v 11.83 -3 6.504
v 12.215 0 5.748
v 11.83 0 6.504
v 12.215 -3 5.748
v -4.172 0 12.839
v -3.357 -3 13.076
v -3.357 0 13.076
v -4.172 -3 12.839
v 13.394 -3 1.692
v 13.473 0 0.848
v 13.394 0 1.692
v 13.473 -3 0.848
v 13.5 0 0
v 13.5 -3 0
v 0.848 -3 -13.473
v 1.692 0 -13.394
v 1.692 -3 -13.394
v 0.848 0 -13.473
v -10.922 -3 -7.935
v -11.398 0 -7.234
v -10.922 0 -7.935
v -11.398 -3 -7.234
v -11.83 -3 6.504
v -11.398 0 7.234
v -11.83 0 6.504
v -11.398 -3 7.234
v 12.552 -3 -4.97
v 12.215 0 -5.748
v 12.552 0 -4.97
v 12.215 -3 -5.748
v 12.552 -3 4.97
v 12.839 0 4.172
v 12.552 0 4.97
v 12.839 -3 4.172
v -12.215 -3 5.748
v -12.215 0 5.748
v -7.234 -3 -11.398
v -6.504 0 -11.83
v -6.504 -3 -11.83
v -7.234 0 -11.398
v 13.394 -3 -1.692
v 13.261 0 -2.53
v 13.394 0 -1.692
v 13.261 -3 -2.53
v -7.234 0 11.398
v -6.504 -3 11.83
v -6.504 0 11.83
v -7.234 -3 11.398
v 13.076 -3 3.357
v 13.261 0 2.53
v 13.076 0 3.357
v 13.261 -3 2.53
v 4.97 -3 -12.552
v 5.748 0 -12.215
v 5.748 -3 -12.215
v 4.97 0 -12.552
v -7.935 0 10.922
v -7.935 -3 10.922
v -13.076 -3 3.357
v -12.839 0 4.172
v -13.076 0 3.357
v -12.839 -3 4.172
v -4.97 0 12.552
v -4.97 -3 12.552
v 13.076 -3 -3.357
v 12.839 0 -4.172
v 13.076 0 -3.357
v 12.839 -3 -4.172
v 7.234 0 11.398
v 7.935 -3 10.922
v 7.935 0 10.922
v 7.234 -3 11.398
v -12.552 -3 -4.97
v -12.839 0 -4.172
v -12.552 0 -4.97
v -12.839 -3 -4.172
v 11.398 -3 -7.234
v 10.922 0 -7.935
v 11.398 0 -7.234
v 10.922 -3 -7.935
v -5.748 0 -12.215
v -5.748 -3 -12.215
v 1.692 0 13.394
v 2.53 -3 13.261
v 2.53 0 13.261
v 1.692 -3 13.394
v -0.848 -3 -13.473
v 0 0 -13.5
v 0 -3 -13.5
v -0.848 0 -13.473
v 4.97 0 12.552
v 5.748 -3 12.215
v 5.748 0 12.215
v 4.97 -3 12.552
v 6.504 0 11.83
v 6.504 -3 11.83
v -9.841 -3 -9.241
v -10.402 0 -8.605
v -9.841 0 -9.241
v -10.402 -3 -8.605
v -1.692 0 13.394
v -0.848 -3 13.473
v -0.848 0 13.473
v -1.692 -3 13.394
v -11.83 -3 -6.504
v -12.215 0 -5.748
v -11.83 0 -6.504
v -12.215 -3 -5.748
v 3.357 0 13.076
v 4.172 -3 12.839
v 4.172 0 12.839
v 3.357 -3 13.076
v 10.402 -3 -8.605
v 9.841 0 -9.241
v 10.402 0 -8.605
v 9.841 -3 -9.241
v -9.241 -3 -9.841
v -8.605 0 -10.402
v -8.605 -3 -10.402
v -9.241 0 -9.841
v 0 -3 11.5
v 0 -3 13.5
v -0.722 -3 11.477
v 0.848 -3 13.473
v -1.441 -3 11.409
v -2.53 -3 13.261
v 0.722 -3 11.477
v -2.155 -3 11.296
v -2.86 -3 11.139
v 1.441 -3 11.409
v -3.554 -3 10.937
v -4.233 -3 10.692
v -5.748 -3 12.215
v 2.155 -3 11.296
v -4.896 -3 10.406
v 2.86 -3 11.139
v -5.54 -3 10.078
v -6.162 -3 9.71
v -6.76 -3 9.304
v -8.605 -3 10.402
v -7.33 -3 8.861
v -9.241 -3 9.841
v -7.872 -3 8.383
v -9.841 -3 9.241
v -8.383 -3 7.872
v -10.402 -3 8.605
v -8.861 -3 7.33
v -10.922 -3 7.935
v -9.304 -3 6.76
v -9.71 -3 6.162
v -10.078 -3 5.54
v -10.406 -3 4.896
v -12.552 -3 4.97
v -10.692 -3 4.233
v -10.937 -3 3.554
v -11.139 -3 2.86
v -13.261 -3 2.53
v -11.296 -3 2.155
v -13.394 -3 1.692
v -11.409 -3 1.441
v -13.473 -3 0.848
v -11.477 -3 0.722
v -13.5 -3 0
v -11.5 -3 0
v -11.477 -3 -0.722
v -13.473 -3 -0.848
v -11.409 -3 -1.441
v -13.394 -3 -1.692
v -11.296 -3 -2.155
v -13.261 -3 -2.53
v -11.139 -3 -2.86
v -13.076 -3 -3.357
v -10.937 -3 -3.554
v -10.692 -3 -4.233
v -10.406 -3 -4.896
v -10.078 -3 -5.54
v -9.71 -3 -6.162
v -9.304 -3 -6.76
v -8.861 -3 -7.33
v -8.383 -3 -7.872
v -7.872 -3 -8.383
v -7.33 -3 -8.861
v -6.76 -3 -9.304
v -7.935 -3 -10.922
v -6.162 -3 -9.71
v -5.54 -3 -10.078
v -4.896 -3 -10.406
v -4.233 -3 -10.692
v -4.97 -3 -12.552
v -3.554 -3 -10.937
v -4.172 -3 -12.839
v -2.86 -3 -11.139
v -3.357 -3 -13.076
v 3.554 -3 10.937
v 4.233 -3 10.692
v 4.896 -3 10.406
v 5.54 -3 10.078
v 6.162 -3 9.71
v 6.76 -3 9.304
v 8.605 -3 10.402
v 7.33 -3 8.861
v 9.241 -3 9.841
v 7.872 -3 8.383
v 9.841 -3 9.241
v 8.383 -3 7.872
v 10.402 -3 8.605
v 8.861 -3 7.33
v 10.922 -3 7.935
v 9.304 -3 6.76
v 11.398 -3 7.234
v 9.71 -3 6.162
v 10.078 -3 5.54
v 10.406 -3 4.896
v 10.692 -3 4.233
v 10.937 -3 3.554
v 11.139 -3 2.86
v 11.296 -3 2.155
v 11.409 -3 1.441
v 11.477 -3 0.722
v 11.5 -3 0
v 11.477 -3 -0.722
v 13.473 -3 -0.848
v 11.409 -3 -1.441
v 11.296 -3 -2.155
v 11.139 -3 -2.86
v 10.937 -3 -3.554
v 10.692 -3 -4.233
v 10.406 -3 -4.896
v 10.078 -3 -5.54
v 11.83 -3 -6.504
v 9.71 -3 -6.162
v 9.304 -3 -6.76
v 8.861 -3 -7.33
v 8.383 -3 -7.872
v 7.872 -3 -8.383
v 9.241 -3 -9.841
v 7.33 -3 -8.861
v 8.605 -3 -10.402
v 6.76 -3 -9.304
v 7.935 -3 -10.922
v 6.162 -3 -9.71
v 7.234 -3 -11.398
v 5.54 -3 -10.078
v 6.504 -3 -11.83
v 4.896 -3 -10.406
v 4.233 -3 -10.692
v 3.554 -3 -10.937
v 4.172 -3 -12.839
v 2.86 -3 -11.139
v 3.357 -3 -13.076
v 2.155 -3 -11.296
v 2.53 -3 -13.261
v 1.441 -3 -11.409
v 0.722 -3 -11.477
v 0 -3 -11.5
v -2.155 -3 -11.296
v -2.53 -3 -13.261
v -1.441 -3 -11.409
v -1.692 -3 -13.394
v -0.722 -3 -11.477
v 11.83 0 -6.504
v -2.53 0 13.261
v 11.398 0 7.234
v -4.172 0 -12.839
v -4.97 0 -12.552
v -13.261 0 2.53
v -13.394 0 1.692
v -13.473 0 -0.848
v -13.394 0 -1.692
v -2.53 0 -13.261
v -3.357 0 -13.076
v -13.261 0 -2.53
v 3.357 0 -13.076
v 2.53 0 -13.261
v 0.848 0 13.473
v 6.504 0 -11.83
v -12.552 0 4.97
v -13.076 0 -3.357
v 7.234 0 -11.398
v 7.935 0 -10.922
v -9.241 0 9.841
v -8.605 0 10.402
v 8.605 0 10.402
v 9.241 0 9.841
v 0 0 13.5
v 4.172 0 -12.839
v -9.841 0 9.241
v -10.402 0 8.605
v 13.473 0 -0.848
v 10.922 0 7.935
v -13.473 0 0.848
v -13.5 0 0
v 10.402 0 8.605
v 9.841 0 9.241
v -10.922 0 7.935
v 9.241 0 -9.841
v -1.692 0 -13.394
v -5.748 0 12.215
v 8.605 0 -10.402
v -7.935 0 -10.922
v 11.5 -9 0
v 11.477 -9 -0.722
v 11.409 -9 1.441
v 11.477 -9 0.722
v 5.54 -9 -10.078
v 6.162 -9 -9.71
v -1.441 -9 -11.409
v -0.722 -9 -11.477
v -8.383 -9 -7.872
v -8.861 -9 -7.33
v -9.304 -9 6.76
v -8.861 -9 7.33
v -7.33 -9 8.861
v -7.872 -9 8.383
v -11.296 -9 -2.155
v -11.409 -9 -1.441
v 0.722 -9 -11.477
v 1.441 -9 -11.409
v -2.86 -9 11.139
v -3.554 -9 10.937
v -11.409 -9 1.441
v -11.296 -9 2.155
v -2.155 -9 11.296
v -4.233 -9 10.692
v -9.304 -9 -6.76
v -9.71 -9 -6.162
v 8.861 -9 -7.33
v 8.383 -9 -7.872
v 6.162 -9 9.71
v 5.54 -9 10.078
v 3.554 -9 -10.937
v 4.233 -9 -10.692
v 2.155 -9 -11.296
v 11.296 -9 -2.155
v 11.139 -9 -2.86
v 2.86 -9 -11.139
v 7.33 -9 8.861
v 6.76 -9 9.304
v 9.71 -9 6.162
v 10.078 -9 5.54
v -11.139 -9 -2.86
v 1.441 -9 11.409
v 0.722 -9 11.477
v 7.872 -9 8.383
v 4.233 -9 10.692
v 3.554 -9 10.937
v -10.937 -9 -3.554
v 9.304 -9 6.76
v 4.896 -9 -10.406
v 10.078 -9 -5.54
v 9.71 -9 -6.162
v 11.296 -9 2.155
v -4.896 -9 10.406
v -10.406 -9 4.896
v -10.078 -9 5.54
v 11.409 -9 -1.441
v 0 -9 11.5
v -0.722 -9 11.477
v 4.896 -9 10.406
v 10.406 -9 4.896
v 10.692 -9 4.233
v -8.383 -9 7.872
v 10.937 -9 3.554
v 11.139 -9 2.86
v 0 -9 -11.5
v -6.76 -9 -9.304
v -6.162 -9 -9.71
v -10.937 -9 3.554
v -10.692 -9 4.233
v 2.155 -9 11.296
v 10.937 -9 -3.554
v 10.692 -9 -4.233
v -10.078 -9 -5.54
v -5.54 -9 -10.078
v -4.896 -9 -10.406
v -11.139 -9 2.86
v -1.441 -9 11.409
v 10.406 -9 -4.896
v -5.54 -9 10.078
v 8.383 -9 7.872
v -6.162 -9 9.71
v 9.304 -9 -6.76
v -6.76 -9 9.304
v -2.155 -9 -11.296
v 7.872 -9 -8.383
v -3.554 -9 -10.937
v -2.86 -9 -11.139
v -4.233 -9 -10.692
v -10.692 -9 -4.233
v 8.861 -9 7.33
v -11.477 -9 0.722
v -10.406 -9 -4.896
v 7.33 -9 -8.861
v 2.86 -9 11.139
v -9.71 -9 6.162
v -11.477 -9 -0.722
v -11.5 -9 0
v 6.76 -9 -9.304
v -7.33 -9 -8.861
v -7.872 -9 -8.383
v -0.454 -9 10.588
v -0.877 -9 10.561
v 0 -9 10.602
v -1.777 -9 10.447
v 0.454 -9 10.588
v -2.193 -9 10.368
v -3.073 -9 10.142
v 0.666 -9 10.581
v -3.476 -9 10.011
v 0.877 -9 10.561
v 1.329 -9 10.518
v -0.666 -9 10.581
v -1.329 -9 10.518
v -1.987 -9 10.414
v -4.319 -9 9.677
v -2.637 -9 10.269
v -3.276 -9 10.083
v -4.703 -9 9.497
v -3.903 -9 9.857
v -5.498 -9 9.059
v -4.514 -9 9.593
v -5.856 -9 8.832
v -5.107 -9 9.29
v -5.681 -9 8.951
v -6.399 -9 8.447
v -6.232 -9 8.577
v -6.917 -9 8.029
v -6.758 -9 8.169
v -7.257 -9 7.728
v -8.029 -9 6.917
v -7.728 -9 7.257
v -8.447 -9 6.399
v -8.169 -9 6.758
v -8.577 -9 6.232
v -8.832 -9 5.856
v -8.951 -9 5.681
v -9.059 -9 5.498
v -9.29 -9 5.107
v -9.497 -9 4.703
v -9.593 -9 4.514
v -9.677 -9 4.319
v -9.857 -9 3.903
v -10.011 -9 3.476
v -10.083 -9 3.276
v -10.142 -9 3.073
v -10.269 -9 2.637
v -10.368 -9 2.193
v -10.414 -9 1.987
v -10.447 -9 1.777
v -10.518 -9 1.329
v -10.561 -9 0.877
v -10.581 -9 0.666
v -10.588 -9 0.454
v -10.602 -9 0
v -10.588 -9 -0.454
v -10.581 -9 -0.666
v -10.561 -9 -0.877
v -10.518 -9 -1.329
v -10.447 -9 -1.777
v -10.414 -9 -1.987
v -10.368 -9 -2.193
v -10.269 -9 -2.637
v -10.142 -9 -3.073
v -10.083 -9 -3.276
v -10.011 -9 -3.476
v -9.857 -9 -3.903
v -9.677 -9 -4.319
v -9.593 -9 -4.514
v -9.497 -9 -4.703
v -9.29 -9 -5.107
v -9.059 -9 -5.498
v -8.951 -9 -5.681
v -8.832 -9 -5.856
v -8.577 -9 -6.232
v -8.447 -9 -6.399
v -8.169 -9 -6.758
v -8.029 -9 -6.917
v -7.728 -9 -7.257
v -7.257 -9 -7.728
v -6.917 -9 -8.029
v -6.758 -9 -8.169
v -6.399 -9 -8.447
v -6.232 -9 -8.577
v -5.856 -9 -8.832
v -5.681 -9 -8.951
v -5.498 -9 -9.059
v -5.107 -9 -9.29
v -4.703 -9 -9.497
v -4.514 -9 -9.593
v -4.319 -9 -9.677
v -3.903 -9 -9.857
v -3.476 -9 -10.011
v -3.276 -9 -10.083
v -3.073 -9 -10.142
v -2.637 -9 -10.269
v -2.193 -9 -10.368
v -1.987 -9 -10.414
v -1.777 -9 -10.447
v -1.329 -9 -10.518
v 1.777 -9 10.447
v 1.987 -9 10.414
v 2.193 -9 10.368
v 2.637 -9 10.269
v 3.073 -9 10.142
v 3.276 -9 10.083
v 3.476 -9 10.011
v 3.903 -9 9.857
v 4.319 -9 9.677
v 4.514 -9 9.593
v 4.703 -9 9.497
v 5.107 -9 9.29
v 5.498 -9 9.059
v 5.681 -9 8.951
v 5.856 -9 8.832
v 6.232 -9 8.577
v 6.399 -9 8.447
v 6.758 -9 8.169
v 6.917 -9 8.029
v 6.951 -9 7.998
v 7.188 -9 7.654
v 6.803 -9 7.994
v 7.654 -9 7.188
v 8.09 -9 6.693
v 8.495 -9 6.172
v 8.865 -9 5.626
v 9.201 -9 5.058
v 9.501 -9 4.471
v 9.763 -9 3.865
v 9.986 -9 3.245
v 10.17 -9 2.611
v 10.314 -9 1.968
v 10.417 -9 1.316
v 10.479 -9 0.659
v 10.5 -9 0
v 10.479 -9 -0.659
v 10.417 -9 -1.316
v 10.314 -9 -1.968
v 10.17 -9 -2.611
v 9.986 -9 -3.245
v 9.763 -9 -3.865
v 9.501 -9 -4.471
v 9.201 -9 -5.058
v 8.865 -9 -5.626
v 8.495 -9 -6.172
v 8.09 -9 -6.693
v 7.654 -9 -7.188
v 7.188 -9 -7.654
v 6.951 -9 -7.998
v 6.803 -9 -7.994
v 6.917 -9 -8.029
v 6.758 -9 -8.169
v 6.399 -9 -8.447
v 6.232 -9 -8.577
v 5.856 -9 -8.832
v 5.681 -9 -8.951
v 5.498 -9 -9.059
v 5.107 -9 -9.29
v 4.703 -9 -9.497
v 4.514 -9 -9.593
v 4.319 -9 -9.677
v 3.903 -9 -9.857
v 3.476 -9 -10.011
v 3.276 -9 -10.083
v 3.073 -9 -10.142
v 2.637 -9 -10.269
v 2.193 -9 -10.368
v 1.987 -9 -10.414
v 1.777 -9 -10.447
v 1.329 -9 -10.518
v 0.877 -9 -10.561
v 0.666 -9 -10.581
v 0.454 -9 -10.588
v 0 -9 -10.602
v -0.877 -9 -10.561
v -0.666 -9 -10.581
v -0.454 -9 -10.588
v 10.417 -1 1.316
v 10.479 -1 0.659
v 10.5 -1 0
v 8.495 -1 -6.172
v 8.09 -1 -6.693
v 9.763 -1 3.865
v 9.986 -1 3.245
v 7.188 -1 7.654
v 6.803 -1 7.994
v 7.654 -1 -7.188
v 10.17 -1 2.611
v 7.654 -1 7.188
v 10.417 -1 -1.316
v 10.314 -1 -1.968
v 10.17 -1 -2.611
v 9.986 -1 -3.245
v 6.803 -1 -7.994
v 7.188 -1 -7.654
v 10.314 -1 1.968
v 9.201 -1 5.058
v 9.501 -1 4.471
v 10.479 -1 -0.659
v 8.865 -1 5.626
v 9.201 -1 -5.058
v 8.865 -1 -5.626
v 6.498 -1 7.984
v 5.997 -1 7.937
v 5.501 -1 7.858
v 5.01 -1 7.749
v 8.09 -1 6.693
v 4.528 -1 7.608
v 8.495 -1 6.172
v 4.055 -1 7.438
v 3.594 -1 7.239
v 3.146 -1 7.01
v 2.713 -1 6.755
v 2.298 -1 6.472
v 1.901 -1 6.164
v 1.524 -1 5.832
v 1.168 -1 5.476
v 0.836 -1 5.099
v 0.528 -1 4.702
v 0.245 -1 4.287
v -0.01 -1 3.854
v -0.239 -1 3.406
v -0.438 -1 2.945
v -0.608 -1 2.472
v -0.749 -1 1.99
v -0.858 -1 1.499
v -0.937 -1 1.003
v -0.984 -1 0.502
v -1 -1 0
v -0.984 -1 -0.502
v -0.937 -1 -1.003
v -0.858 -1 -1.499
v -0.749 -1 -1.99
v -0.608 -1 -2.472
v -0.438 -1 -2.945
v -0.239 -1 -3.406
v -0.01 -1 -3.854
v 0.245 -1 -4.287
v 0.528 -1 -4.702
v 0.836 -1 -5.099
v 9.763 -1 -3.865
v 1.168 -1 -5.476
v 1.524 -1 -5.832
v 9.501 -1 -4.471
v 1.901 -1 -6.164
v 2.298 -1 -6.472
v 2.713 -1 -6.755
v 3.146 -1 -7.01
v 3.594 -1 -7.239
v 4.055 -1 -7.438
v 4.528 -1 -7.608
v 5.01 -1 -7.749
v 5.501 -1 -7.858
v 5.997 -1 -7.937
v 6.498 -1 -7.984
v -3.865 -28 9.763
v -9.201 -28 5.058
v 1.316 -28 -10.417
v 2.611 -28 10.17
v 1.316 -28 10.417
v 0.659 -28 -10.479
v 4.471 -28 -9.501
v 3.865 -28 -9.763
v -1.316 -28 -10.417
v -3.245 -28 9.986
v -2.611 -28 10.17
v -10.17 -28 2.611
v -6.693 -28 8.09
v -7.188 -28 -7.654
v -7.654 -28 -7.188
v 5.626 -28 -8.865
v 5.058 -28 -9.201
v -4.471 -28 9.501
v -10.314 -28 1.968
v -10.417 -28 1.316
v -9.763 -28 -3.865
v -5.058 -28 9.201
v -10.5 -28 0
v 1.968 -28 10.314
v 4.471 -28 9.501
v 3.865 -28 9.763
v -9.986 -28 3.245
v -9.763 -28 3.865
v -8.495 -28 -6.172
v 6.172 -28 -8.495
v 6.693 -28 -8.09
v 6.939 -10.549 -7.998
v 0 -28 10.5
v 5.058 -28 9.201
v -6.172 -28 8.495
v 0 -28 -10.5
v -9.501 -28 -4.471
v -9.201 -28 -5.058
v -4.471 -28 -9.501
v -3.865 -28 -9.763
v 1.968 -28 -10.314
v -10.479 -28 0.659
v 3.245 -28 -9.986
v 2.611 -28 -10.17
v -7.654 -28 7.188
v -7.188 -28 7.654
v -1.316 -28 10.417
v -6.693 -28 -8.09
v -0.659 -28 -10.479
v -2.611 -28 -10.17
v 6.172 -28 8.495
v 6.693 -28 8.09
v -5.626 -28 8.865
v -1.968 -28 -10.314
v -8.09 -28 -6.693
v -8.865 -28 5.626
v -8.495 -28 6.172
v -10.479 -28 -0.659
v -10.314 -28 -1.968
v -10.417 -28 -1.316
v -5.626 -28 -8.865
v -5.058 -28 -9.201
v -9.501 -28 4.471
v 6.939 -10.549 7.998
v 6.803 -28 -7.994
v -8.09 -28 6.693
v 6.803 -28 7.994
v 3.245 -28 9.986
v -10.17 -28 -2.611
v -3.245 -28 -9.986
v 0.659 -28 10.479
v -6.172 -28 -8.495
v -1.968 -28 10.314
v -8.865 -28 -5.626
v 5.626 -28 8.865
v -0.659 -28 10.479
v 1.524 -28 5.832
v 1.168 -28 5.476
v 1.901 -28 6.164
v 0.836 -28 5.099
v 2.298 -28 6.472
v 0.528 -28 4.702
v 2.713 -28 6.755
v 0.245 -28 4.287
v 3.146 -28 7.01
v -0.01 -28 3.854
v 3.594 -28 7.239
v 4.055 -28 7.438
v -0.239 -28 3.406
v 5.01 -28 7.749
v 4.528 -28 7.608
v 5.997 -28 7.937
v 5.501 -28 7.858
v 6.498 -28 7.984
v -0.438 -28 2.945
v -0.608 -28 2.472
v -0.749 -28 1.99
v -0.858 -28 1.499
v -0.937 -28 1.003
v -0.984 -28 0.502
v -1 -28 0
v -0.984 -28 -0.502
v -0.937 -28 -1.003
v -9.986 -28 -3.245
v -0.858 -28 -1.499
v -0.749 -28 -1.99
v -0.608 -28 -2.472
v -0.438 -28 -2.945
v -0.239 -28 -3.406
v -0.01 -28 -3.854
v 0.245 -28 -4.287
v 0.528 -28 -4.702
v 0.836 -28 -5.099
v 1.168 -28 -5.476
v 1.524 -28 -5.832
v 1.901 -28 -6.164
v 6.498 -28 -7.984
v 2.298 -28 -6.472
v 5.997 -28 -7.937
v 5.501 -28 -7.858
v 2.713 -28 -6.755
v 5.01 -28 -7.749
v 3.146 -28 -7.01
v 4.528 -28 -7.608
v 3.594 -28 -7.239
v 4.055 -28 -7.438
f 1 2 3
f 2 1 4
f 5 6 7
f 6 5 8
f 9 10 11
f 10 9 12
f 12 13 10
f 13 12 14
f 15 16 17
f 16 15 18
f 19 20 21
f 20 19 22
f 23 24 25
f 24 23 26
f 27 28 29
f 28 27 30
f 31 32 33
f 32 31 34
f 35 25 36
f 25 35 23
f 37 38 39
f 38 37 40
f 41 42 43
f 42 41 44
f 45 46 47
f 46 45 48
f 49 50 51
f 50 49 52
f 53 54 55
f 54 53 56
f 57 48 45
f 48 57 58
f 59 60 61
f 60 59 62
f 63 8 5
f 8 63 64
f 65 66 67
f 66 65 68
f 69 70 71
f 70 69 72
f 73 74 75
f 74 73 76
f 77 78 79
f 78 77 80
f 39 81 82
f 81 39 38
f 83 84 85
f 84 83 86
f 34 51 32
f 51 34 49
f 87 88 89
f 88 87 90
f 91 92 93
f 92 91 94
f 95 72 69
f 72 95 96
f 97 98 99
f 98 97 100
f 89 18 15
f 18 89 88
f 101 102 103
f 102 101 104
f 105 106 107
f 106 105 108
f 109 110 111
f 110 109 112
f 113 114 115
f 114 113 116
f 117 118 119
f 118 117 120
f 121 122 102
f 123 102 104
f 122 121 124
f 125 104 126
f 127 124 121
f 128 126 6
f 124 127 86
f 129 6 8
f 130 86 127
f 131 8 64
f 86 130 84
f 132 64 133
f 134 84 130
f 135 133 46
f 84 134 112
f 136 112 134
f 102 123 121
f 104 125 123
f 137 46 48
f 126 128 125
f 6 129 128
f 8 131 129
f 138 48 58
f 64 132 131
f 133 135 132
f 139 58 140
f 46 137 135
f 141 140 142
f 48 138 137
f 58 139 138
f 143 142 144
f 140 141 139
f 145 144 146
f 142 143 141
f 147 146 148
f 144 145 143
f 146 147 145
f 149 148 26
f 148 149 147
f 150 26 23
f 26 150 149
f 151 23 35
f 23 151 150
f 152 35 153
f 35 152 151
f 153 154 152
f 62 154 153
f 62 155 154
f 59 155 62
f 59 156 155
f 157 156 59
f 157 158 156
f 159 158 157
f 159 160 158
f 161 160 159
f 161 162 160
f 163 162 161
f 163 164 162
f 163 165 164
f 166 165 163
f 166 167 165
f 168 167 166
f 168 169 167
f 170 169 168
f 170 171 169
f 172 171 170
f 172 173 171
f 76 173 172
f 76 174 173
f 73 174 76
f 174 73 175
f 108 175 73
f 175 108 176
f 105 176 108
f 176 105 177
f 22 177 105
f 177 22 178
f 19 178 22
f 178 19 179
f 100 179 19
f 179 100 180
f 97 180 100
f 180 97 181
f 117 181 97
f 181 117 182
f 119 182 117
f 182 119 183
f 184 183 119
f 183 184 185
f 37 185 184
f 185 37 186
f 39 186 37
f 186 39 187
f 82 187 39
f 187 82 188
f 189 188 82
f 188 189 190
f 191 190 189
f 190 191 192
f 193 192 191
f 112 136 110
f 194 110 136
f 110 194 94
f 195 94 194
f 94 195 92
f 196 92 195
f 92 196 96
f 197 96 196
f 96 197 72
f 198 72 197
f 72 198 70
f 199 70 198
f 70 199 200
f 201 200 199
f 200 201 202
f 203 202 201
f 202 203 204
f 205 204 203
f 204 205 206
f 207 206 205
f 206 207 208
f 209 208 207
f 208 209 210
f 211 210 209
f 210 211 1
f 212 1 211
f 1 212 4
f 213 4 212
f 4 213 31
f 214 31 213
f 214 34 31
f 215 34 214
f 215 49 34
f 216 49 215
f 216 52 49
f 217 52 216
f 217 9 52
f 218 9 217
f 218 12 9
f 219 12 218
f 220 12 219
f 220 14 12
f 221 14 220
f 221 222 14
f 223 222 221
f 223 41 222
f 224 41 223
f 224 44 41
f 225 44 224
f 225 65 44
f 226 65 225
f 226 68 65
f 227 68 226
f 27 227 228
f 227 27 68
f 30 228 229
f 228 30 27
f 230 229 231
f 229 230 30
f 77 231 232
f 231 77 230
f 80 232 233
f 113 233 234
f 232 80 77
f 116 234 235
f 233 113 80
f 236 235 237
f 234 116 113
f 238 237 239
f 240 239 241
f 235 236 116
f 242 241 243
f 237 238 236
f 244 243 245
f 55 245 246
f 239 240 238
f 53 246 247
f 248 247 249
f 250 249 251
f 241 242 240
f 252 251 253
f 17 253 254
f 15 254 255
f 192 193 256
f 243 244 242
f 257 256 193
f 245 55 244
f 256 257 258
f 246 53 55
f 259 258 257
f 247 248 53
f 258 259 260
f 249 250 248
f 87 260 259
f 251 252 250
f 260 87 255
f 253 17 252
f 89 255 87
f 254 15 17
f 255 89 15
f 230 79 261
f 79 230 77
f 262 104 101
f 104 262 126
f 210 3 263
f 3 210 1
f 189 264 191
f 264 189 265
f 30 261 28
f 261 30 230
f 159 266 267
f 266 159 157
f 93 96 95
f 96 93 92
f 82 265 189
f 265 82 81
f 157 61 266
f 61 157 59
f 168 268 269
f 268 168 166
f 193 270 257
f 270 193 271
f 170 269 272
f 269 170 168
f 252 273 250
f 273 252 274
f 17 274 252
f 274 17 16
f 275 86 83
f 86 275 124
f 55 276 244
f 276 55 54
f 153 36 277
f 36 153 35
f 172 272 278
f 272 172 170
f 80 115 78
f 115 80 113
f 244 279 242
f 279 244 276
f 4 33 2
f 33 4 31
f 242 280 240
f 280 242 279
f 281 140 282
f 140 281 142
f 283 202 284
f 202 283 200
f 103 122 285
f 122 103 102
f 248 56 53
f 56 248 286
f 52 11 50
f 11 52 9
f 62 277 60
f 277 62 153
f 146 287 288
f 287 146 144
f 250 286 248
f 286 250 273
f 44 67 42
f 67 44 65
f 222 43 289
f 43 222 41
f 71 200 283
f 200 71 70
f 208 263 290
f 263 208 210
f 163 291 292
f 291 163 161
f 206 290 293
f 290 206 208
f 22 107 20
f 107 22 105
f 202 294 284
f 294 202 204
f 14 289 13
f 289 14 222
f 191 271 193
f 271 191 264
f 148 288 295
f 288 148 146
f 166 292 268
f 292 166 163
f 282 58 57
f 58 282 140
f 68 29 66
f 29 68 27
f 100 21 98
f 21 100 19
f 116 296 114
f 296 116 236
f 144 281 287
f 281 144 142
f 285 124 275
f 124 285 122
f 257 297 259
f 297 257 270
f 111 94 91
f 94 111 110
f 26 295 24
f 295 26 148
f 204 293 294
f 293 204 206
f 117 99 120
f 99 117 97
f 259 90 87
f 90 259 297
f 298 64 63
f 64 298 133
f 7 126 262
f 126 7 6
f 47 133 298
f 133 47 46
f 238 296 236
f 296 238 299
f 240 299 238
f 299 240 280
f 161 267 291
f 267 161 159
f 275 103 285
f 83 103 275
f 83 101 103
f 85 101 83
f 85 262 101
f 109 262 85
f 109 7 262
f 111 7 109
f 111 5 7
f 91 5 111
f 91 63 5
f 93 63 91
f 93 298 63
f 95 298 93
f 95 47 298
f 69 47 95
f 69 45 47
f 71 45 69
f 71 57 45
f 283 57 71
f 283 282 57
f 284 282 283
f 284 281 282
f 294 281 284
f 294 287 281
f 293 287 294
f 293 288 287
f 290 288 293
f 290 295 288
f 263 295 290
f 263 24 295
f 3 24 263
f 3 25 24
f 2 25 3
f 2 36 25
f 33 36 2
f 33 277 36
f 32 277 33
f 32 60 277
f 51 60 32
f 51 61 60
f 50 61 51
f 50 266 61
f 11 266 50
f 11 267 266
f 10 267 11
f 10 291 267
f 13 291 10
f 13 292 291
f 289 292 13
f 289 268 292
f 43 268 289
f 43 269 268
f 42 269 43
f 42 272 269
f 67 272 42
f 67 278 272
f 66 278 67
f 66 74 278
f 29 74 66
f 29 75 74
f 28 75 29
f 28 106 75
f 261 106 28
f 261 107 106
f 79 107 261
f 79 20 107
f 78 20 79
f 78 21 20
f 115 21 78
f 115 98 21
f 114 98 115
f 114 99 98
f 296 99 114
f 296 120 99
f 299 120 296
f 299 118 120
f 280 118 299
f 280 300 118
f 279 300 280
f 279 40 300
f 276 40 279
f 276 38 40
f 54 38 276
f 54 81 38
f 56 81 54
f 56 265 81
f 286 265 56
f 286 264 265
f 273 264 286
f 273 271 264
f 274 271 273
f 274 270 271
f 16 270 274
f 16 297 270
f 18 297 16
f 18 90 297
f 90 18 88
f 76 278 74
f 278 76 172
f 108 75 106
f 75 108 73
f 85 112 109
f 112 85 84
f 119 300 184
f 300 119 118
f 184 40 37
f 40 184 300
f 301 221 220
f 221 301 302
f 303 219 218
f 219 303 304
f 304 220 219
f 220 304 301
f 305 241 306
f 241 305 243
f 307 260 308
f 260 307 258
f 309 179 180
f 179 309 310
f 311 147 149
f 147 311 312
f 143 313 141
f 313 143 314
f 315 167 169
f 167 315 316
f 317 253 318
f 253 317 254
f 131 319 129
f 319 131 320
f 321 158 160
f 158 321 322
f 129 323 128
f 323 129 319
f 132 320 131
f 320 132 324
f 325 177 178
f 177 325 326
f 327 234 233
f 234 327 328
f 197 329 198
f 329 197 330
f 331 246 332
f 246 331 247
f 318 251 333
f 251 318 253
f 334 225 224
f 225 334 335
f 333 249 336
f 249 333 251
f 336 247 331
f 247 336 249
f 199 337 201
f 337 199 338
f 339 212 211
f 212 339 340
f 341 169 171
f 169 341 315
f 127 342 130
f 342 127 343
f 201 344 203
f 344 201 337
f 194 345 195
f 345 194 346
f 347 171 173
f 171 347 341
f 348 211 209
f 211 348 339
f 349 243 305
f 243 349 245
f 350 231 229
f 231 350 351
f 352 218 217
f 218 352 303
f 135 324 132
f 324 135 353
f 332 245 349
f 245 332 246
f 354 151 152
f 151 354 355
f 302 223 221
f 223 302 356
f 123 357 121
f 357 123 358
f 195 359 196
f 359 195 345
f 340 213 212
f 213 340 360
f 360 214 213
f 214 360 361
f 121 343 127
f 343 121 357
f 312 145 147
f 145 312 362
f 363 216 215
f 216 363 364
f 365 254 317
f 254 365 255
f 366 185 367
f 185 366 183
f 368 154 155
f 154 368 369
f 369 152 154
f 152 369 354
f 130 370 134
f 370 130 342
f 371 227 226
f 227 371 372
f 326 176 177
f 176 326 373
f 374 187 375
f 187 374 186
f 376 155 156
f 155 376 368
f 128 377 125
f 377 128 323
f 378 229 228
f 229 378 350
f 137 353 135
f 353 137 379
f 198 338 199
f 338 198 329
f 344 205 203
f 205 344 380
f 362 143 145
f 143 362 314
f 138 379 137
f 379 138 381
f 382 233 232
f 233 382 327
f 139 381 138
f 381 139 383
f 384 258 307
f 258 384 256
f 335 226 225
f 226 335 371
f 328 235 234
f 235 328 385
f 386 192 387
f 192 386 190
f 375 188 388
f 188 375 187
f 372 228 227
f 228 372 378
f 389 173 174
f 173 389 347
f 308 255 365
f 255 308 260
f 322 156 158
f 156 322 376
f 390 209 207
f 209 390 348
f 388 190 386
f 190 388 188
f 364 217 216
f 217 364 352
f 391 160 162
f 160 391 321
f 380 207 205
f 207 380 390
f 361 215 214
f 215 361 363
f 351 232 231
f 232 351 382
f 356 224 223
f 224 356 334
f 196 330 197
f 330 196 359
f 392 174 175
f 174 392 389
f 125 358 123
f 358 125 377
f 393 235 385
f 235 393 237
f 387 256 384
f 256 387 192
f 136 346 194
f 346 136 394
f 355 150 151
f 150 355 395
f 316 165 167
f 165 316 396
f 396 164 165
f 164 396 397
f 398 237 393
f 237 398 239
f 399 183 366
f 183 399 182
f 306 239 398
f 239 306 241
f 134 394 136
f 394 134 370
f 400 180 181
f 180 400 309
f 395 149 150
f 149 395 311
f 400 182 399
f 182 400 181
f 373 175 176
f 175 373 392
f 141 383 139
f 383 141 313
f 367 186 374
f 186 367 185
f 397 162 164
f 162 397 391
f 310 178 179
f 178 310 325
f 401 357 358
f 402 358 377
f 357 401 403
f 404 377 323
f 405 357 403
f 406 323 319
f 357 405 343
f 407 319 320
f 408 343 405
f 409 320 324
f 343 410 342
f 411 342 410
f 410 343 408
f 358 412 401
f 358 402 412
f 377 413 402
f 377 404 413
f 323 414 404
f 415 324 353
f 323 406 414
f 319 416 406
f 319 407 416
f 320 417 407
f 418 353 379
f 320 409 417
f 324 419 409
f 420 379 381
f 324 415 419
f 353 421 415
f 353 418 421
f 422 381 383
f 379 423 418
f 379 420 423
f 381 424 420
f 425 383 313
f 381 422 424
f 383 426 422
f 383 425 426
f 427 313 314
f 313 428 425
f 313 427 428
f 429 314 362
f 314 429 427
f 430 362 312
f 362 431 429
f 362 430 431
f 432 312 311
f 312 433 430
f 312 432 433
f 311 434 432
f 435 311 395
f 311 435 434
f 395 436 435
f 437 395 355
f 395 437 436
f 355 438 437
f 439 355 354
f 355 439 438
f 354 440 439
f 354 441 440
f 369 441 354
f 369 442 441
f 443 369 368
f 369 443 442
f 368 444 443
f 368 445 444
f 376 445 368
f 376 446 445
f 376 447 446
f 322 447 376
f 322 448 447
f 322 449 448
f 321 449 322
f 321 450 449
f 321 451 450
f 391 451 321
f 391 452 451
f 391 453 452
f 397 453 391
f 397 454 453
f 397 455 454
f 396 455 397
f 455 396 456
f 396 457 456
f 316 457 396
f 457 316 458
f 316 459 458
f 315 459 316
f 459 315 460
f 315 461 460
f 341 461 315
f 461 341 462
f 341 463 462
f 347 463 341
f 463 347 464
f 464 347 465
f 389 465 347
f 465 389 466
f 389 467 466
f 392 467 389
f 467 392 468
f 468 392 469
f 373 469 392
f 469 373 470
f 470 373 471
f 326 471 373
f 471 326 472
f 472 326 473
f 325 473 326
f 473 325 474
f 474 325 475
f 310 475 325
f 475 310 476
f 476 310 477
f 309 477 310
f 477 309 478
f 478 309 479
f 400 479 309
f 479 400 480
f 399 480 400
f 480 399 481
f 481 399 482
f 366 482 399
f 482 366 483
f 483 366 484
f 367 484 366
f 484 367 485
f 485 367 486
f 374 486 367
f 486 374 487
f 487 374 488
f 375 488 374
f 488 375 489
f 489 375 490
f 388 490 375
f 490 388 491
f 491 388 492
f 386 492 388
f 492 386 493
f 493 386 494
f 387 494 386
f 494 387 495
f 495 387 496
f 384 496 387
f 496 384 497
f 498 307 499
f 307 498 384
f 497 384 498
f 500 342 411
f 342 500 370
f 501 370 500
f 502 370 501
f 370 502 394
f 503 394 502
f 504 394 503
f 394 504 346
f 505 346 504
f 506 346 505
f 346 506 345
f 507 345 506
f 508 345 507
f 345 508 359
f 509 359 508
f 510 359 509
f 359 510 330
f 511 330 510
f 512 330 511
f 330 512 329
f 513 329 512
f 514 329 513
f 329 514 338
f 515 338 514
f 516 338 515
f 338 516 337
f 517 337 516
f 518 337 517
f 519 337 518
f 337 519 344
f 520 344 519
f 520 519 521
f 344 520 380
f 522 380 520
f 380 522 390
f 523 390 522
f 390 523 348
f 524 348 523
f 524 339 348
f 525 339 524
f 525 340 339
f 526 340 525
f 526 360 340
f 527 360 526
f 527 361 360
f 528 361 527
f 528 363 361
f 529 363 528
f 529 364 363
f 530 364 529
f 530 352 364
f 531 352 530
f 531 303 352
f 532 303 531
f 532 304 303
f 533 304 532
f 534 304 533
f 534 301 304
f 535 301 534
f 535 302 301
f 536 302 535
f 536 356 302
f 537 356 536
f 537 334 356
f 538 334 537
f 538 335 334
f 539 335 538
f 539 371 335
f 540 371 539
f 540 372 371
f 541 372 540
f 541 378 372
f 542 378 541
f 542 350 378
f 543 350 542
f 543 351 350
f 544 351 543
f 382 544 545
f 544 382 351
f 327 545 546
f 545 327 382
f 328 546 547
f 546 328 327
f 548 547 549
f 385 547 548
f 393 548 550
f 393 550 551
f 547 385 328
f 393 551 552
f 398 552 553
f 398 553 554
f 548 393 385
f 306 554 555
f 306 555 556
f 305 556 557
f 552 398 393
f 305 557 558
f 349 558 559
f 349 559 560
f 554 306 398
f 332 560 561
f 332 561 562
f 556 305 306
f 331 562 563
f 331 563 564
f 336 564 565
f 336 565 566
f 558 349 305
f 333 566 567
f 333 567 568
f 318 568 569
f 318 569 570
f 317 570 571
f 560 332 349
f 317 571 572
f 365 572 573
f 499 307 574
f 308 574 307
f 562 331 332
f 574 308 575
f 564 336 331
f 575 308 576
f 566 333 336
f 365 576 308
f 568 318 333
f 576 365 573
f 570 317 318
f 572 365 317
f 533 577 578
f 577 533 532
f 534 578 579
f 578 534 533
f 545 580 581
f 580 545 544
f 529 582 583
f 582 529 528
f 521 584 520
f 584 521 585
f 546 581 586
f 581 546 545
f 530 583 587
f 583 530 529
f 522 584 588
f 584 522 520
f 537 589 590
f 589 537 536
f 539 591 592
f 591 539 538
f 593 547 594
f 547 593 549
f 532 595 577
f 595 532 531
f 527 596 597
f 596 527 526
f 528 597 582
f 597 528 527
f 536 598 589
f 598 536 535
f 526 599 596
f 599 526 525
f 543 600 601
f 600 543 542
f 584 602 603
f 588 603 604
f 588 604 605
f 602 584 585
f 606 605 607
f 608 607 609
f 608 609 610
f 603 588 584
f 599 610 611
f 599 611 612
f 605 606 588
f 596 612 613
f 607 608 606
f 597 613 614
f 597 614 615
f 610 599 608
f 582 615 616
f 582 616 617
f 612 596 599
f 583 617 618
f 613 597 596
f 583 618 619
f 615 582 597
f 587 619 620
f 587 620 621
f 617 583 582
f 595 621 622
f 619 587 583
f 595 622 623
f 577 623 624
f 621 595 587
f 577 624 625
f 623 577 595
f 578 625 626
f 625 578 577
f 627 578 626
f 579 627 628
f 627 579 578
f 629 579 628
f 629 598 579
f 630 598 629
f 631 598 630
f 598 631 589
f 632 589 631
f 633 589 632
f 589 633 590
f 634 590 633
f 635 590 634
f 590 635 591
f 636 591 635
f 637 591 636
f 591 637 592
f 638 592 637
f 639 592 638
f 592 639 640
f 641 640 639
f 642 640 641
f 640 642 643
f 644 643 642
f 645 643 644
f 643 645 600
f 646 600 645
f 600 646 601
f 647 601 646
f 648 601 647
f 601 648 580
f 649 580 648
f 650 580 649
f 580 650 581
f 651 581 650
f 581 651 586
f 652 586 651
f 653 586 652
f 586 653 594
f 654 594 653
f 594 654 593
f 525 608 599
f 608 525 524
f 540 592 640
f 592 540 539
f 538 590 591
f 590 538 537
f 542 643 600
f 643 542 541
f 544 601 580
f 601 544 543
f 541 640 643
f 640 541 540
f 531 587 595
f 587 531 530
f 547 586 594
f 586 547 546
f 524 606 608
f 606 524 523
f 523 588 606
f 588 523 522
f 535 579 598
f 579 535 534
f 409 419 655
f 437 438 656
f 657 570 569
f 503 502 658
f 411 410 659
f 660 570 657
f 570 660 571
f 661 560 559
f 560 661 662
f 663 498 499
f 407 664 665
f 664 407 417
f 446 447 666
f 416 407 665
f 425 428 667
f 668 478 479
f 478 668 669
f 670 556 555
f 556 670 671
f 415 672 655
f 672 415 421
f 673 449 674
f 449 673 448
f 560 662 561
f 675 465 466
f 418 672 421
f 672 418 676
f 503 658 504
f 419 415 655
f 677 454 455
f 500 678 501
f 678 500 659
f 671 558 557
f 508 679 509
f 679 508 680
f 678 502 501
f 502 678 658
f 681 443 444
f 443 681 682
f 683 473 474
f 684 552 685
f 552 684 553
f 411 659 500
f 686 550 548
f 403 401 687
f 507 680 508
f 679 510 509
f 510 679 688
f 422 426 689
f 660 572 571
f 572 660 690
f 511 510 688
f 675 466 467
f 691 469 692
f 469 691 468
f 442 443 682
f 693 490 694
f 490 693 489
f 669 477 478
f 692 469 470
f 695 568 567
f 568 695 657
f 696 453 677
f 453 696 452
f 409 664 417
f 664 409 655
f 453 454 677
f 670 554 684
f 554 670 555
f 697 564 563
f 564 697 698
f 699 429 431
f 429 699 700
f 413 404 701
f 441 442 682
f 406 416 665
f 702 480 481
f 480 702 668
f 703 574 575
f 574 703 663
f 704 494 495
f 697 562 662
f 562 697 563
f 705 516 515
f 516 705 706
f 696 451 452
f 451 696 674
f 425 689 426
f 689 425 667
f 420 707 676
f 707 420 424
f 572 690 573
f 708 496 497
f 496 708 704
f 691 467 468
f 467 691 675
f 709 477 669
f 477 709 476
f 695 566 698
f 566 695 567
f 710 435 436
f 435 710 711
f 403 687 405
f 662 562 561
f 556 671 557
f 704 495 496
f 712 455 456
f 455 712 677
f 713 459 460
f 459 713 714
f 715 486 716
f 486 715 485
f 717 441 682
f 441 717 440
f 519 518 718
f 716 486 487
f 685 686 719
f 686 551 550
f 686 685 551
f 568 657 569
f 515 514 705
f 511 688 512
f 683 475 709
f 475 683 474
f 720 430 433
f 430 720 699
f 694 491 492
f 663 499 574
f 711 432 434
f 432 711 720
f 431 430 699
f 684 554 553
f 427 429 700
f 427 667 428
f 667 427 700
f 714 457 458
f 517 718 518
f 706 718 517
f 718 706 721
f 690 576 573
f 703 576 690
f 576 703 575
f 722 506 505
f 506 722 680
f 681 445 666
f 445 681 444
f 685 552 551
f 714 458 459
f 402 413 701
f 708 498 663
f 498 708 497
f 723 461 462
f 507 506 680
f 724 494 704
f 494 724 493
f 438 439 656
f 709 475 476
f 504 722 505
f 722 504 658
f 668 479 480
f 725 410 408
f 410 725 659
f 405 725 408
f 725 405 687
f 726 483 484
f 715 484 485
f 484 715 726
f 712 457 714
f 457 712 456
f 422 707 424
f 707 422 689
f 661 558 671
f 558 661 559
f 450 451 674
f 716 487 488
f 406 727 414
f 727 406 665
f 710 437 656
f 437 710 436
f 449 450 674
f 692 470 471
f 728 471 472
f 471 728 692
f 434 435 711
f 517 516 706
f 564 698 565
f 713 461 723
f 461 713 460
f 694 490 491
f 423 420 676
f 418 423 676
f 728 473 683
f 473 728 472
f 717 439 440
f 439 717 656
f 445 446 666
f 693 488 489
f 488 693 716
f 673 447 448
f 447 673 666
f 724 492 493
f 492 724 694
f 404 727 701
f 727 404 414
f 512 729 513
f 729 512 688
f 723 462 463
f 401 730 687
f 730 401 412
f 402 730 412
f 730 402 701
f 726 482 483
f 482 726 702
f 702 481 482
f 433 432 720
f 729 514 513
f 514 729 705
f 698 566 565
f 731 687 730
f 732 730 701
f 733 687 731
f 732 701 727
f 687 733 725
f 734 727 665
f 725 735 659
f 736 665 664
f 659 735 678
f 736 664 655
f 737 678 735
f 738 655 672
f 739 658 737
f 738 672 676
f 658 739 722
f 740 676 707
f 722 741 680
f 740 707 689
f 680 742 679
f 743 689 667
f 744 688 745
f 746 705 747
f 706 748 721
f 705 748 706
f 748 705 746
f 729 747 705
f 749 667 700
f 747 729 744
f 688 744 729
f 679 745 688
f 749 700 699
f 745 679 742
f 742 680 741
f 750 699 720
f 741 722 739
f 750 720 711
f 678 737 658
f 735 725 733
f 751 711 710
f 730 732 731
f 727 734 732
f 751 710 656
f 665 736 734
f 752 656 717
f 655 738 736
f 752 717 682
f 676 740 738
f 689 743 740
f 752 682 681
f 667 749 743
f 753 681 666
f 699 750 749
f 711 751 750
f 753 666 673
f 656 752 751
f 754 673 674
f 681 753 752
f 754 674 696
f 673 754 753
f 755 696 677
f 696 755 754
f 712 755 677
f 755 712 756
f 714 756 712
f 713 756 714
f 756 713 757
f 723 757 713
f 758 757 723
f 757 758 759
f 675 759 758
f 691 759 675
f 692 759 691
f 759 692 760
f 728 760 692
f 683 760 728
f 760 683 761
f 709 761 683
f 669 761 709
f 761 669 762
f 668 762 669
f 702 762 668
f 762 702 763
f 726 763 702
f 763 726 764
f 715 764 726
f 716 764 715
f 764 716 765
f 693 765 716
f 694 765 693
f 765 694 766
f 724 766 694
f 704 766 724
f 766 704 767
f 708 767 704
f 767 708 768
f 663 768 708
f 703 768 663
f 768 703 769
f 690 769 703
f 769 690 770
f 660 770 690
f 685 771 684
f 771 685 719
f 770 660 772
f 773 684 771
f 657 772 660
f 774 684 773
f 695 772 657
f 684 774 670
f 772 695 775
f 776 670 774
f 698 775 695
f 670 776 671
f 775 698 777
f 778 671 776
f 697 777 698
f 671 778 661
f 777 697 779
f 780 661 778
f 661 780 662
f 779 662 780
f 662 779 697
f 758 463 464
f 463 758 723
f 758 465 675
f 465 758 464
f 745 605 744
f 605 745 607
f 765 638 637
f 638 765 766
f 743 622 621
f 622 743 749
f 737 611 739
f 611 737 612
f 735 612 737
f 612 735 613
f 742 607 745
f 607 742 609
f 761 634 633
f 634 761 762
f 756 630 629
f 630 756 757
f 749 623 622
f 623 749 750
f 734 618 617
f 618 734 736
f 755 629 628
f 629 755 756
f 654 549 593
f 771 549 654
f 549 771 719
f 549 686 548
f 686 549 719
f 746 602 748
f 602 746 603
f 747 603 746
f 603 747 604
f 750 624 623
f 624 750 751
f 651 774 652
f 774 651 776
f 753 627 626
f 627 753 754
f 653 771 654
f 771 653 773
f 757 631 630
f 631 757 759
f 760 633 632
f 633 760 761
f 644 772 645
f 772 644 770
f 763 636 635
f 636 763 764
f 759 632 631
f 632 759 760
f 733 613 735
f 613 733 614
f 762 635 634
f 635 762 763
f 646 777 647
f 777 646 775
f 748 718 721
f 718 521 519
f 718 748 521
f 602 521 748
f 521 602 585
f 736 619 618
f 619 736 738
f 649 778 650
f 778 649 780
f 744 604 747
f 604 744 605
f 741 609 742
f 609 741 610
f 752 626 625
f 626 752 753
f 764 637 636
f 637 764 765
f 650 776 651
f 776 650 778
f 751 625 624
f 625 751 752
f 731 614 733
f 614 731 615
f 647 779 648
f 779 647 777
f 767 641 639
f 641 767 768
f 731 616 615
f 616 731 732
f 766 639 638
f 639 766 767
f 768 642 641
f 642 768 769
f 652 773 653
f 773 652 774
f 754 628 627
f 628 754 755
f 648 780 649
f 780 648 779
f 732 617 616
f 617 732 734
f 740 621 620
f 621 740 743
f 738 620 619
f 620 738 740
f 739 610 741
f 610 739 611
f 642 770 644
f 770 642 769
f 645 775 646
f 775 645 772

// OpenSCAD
// file: jeroen2.scad
difference(){
	union(){

        translate([0,0,0]){
            rotate([90,0,0]){
                cylinder(h=28, r1=21.3/2,  r2=21/2, $fn=100, center=false);
            }
        }       


            }
            union() {

                translate([7,1,0]){
                    rotate([90,0,0]){
                        cylinder(h=30, r=16/2, $fn=100, center=false);
                    }
                }       

           

            }
        }
// file: jeroen.scad
difference(){
	union(){


        difference(){
            union(){
                

                translate([0,0,0]){
                    rotate([90,0,0]){
                        cylinder(h=3, r=27/2, $fn=100, center=false);
                    }
                }       

                translate([0,0,0]){
                    rotate([90,0,0]){
                        cylinder(h=9, r=23/2, $fn=100, center=false);
                    }
                }       
            }
            union() {

                translate([0,-1,0]){
                    rotate([90,0,0]){
                        cylinder(h=12, r=21/2, $fn=100, center=false);
                    }
                }       




           

            }
        }


            }
            union() {


           

            }
        }
// main file
        translate([0,0,0]){
            rotate([0,0,0]){
                include <jeroen.scad>;                
            }
        } 
        
        translate([0,0,0]){
            rotate([0,0,0]){
                include <jeroen2.scad>;                
            }
        }         
